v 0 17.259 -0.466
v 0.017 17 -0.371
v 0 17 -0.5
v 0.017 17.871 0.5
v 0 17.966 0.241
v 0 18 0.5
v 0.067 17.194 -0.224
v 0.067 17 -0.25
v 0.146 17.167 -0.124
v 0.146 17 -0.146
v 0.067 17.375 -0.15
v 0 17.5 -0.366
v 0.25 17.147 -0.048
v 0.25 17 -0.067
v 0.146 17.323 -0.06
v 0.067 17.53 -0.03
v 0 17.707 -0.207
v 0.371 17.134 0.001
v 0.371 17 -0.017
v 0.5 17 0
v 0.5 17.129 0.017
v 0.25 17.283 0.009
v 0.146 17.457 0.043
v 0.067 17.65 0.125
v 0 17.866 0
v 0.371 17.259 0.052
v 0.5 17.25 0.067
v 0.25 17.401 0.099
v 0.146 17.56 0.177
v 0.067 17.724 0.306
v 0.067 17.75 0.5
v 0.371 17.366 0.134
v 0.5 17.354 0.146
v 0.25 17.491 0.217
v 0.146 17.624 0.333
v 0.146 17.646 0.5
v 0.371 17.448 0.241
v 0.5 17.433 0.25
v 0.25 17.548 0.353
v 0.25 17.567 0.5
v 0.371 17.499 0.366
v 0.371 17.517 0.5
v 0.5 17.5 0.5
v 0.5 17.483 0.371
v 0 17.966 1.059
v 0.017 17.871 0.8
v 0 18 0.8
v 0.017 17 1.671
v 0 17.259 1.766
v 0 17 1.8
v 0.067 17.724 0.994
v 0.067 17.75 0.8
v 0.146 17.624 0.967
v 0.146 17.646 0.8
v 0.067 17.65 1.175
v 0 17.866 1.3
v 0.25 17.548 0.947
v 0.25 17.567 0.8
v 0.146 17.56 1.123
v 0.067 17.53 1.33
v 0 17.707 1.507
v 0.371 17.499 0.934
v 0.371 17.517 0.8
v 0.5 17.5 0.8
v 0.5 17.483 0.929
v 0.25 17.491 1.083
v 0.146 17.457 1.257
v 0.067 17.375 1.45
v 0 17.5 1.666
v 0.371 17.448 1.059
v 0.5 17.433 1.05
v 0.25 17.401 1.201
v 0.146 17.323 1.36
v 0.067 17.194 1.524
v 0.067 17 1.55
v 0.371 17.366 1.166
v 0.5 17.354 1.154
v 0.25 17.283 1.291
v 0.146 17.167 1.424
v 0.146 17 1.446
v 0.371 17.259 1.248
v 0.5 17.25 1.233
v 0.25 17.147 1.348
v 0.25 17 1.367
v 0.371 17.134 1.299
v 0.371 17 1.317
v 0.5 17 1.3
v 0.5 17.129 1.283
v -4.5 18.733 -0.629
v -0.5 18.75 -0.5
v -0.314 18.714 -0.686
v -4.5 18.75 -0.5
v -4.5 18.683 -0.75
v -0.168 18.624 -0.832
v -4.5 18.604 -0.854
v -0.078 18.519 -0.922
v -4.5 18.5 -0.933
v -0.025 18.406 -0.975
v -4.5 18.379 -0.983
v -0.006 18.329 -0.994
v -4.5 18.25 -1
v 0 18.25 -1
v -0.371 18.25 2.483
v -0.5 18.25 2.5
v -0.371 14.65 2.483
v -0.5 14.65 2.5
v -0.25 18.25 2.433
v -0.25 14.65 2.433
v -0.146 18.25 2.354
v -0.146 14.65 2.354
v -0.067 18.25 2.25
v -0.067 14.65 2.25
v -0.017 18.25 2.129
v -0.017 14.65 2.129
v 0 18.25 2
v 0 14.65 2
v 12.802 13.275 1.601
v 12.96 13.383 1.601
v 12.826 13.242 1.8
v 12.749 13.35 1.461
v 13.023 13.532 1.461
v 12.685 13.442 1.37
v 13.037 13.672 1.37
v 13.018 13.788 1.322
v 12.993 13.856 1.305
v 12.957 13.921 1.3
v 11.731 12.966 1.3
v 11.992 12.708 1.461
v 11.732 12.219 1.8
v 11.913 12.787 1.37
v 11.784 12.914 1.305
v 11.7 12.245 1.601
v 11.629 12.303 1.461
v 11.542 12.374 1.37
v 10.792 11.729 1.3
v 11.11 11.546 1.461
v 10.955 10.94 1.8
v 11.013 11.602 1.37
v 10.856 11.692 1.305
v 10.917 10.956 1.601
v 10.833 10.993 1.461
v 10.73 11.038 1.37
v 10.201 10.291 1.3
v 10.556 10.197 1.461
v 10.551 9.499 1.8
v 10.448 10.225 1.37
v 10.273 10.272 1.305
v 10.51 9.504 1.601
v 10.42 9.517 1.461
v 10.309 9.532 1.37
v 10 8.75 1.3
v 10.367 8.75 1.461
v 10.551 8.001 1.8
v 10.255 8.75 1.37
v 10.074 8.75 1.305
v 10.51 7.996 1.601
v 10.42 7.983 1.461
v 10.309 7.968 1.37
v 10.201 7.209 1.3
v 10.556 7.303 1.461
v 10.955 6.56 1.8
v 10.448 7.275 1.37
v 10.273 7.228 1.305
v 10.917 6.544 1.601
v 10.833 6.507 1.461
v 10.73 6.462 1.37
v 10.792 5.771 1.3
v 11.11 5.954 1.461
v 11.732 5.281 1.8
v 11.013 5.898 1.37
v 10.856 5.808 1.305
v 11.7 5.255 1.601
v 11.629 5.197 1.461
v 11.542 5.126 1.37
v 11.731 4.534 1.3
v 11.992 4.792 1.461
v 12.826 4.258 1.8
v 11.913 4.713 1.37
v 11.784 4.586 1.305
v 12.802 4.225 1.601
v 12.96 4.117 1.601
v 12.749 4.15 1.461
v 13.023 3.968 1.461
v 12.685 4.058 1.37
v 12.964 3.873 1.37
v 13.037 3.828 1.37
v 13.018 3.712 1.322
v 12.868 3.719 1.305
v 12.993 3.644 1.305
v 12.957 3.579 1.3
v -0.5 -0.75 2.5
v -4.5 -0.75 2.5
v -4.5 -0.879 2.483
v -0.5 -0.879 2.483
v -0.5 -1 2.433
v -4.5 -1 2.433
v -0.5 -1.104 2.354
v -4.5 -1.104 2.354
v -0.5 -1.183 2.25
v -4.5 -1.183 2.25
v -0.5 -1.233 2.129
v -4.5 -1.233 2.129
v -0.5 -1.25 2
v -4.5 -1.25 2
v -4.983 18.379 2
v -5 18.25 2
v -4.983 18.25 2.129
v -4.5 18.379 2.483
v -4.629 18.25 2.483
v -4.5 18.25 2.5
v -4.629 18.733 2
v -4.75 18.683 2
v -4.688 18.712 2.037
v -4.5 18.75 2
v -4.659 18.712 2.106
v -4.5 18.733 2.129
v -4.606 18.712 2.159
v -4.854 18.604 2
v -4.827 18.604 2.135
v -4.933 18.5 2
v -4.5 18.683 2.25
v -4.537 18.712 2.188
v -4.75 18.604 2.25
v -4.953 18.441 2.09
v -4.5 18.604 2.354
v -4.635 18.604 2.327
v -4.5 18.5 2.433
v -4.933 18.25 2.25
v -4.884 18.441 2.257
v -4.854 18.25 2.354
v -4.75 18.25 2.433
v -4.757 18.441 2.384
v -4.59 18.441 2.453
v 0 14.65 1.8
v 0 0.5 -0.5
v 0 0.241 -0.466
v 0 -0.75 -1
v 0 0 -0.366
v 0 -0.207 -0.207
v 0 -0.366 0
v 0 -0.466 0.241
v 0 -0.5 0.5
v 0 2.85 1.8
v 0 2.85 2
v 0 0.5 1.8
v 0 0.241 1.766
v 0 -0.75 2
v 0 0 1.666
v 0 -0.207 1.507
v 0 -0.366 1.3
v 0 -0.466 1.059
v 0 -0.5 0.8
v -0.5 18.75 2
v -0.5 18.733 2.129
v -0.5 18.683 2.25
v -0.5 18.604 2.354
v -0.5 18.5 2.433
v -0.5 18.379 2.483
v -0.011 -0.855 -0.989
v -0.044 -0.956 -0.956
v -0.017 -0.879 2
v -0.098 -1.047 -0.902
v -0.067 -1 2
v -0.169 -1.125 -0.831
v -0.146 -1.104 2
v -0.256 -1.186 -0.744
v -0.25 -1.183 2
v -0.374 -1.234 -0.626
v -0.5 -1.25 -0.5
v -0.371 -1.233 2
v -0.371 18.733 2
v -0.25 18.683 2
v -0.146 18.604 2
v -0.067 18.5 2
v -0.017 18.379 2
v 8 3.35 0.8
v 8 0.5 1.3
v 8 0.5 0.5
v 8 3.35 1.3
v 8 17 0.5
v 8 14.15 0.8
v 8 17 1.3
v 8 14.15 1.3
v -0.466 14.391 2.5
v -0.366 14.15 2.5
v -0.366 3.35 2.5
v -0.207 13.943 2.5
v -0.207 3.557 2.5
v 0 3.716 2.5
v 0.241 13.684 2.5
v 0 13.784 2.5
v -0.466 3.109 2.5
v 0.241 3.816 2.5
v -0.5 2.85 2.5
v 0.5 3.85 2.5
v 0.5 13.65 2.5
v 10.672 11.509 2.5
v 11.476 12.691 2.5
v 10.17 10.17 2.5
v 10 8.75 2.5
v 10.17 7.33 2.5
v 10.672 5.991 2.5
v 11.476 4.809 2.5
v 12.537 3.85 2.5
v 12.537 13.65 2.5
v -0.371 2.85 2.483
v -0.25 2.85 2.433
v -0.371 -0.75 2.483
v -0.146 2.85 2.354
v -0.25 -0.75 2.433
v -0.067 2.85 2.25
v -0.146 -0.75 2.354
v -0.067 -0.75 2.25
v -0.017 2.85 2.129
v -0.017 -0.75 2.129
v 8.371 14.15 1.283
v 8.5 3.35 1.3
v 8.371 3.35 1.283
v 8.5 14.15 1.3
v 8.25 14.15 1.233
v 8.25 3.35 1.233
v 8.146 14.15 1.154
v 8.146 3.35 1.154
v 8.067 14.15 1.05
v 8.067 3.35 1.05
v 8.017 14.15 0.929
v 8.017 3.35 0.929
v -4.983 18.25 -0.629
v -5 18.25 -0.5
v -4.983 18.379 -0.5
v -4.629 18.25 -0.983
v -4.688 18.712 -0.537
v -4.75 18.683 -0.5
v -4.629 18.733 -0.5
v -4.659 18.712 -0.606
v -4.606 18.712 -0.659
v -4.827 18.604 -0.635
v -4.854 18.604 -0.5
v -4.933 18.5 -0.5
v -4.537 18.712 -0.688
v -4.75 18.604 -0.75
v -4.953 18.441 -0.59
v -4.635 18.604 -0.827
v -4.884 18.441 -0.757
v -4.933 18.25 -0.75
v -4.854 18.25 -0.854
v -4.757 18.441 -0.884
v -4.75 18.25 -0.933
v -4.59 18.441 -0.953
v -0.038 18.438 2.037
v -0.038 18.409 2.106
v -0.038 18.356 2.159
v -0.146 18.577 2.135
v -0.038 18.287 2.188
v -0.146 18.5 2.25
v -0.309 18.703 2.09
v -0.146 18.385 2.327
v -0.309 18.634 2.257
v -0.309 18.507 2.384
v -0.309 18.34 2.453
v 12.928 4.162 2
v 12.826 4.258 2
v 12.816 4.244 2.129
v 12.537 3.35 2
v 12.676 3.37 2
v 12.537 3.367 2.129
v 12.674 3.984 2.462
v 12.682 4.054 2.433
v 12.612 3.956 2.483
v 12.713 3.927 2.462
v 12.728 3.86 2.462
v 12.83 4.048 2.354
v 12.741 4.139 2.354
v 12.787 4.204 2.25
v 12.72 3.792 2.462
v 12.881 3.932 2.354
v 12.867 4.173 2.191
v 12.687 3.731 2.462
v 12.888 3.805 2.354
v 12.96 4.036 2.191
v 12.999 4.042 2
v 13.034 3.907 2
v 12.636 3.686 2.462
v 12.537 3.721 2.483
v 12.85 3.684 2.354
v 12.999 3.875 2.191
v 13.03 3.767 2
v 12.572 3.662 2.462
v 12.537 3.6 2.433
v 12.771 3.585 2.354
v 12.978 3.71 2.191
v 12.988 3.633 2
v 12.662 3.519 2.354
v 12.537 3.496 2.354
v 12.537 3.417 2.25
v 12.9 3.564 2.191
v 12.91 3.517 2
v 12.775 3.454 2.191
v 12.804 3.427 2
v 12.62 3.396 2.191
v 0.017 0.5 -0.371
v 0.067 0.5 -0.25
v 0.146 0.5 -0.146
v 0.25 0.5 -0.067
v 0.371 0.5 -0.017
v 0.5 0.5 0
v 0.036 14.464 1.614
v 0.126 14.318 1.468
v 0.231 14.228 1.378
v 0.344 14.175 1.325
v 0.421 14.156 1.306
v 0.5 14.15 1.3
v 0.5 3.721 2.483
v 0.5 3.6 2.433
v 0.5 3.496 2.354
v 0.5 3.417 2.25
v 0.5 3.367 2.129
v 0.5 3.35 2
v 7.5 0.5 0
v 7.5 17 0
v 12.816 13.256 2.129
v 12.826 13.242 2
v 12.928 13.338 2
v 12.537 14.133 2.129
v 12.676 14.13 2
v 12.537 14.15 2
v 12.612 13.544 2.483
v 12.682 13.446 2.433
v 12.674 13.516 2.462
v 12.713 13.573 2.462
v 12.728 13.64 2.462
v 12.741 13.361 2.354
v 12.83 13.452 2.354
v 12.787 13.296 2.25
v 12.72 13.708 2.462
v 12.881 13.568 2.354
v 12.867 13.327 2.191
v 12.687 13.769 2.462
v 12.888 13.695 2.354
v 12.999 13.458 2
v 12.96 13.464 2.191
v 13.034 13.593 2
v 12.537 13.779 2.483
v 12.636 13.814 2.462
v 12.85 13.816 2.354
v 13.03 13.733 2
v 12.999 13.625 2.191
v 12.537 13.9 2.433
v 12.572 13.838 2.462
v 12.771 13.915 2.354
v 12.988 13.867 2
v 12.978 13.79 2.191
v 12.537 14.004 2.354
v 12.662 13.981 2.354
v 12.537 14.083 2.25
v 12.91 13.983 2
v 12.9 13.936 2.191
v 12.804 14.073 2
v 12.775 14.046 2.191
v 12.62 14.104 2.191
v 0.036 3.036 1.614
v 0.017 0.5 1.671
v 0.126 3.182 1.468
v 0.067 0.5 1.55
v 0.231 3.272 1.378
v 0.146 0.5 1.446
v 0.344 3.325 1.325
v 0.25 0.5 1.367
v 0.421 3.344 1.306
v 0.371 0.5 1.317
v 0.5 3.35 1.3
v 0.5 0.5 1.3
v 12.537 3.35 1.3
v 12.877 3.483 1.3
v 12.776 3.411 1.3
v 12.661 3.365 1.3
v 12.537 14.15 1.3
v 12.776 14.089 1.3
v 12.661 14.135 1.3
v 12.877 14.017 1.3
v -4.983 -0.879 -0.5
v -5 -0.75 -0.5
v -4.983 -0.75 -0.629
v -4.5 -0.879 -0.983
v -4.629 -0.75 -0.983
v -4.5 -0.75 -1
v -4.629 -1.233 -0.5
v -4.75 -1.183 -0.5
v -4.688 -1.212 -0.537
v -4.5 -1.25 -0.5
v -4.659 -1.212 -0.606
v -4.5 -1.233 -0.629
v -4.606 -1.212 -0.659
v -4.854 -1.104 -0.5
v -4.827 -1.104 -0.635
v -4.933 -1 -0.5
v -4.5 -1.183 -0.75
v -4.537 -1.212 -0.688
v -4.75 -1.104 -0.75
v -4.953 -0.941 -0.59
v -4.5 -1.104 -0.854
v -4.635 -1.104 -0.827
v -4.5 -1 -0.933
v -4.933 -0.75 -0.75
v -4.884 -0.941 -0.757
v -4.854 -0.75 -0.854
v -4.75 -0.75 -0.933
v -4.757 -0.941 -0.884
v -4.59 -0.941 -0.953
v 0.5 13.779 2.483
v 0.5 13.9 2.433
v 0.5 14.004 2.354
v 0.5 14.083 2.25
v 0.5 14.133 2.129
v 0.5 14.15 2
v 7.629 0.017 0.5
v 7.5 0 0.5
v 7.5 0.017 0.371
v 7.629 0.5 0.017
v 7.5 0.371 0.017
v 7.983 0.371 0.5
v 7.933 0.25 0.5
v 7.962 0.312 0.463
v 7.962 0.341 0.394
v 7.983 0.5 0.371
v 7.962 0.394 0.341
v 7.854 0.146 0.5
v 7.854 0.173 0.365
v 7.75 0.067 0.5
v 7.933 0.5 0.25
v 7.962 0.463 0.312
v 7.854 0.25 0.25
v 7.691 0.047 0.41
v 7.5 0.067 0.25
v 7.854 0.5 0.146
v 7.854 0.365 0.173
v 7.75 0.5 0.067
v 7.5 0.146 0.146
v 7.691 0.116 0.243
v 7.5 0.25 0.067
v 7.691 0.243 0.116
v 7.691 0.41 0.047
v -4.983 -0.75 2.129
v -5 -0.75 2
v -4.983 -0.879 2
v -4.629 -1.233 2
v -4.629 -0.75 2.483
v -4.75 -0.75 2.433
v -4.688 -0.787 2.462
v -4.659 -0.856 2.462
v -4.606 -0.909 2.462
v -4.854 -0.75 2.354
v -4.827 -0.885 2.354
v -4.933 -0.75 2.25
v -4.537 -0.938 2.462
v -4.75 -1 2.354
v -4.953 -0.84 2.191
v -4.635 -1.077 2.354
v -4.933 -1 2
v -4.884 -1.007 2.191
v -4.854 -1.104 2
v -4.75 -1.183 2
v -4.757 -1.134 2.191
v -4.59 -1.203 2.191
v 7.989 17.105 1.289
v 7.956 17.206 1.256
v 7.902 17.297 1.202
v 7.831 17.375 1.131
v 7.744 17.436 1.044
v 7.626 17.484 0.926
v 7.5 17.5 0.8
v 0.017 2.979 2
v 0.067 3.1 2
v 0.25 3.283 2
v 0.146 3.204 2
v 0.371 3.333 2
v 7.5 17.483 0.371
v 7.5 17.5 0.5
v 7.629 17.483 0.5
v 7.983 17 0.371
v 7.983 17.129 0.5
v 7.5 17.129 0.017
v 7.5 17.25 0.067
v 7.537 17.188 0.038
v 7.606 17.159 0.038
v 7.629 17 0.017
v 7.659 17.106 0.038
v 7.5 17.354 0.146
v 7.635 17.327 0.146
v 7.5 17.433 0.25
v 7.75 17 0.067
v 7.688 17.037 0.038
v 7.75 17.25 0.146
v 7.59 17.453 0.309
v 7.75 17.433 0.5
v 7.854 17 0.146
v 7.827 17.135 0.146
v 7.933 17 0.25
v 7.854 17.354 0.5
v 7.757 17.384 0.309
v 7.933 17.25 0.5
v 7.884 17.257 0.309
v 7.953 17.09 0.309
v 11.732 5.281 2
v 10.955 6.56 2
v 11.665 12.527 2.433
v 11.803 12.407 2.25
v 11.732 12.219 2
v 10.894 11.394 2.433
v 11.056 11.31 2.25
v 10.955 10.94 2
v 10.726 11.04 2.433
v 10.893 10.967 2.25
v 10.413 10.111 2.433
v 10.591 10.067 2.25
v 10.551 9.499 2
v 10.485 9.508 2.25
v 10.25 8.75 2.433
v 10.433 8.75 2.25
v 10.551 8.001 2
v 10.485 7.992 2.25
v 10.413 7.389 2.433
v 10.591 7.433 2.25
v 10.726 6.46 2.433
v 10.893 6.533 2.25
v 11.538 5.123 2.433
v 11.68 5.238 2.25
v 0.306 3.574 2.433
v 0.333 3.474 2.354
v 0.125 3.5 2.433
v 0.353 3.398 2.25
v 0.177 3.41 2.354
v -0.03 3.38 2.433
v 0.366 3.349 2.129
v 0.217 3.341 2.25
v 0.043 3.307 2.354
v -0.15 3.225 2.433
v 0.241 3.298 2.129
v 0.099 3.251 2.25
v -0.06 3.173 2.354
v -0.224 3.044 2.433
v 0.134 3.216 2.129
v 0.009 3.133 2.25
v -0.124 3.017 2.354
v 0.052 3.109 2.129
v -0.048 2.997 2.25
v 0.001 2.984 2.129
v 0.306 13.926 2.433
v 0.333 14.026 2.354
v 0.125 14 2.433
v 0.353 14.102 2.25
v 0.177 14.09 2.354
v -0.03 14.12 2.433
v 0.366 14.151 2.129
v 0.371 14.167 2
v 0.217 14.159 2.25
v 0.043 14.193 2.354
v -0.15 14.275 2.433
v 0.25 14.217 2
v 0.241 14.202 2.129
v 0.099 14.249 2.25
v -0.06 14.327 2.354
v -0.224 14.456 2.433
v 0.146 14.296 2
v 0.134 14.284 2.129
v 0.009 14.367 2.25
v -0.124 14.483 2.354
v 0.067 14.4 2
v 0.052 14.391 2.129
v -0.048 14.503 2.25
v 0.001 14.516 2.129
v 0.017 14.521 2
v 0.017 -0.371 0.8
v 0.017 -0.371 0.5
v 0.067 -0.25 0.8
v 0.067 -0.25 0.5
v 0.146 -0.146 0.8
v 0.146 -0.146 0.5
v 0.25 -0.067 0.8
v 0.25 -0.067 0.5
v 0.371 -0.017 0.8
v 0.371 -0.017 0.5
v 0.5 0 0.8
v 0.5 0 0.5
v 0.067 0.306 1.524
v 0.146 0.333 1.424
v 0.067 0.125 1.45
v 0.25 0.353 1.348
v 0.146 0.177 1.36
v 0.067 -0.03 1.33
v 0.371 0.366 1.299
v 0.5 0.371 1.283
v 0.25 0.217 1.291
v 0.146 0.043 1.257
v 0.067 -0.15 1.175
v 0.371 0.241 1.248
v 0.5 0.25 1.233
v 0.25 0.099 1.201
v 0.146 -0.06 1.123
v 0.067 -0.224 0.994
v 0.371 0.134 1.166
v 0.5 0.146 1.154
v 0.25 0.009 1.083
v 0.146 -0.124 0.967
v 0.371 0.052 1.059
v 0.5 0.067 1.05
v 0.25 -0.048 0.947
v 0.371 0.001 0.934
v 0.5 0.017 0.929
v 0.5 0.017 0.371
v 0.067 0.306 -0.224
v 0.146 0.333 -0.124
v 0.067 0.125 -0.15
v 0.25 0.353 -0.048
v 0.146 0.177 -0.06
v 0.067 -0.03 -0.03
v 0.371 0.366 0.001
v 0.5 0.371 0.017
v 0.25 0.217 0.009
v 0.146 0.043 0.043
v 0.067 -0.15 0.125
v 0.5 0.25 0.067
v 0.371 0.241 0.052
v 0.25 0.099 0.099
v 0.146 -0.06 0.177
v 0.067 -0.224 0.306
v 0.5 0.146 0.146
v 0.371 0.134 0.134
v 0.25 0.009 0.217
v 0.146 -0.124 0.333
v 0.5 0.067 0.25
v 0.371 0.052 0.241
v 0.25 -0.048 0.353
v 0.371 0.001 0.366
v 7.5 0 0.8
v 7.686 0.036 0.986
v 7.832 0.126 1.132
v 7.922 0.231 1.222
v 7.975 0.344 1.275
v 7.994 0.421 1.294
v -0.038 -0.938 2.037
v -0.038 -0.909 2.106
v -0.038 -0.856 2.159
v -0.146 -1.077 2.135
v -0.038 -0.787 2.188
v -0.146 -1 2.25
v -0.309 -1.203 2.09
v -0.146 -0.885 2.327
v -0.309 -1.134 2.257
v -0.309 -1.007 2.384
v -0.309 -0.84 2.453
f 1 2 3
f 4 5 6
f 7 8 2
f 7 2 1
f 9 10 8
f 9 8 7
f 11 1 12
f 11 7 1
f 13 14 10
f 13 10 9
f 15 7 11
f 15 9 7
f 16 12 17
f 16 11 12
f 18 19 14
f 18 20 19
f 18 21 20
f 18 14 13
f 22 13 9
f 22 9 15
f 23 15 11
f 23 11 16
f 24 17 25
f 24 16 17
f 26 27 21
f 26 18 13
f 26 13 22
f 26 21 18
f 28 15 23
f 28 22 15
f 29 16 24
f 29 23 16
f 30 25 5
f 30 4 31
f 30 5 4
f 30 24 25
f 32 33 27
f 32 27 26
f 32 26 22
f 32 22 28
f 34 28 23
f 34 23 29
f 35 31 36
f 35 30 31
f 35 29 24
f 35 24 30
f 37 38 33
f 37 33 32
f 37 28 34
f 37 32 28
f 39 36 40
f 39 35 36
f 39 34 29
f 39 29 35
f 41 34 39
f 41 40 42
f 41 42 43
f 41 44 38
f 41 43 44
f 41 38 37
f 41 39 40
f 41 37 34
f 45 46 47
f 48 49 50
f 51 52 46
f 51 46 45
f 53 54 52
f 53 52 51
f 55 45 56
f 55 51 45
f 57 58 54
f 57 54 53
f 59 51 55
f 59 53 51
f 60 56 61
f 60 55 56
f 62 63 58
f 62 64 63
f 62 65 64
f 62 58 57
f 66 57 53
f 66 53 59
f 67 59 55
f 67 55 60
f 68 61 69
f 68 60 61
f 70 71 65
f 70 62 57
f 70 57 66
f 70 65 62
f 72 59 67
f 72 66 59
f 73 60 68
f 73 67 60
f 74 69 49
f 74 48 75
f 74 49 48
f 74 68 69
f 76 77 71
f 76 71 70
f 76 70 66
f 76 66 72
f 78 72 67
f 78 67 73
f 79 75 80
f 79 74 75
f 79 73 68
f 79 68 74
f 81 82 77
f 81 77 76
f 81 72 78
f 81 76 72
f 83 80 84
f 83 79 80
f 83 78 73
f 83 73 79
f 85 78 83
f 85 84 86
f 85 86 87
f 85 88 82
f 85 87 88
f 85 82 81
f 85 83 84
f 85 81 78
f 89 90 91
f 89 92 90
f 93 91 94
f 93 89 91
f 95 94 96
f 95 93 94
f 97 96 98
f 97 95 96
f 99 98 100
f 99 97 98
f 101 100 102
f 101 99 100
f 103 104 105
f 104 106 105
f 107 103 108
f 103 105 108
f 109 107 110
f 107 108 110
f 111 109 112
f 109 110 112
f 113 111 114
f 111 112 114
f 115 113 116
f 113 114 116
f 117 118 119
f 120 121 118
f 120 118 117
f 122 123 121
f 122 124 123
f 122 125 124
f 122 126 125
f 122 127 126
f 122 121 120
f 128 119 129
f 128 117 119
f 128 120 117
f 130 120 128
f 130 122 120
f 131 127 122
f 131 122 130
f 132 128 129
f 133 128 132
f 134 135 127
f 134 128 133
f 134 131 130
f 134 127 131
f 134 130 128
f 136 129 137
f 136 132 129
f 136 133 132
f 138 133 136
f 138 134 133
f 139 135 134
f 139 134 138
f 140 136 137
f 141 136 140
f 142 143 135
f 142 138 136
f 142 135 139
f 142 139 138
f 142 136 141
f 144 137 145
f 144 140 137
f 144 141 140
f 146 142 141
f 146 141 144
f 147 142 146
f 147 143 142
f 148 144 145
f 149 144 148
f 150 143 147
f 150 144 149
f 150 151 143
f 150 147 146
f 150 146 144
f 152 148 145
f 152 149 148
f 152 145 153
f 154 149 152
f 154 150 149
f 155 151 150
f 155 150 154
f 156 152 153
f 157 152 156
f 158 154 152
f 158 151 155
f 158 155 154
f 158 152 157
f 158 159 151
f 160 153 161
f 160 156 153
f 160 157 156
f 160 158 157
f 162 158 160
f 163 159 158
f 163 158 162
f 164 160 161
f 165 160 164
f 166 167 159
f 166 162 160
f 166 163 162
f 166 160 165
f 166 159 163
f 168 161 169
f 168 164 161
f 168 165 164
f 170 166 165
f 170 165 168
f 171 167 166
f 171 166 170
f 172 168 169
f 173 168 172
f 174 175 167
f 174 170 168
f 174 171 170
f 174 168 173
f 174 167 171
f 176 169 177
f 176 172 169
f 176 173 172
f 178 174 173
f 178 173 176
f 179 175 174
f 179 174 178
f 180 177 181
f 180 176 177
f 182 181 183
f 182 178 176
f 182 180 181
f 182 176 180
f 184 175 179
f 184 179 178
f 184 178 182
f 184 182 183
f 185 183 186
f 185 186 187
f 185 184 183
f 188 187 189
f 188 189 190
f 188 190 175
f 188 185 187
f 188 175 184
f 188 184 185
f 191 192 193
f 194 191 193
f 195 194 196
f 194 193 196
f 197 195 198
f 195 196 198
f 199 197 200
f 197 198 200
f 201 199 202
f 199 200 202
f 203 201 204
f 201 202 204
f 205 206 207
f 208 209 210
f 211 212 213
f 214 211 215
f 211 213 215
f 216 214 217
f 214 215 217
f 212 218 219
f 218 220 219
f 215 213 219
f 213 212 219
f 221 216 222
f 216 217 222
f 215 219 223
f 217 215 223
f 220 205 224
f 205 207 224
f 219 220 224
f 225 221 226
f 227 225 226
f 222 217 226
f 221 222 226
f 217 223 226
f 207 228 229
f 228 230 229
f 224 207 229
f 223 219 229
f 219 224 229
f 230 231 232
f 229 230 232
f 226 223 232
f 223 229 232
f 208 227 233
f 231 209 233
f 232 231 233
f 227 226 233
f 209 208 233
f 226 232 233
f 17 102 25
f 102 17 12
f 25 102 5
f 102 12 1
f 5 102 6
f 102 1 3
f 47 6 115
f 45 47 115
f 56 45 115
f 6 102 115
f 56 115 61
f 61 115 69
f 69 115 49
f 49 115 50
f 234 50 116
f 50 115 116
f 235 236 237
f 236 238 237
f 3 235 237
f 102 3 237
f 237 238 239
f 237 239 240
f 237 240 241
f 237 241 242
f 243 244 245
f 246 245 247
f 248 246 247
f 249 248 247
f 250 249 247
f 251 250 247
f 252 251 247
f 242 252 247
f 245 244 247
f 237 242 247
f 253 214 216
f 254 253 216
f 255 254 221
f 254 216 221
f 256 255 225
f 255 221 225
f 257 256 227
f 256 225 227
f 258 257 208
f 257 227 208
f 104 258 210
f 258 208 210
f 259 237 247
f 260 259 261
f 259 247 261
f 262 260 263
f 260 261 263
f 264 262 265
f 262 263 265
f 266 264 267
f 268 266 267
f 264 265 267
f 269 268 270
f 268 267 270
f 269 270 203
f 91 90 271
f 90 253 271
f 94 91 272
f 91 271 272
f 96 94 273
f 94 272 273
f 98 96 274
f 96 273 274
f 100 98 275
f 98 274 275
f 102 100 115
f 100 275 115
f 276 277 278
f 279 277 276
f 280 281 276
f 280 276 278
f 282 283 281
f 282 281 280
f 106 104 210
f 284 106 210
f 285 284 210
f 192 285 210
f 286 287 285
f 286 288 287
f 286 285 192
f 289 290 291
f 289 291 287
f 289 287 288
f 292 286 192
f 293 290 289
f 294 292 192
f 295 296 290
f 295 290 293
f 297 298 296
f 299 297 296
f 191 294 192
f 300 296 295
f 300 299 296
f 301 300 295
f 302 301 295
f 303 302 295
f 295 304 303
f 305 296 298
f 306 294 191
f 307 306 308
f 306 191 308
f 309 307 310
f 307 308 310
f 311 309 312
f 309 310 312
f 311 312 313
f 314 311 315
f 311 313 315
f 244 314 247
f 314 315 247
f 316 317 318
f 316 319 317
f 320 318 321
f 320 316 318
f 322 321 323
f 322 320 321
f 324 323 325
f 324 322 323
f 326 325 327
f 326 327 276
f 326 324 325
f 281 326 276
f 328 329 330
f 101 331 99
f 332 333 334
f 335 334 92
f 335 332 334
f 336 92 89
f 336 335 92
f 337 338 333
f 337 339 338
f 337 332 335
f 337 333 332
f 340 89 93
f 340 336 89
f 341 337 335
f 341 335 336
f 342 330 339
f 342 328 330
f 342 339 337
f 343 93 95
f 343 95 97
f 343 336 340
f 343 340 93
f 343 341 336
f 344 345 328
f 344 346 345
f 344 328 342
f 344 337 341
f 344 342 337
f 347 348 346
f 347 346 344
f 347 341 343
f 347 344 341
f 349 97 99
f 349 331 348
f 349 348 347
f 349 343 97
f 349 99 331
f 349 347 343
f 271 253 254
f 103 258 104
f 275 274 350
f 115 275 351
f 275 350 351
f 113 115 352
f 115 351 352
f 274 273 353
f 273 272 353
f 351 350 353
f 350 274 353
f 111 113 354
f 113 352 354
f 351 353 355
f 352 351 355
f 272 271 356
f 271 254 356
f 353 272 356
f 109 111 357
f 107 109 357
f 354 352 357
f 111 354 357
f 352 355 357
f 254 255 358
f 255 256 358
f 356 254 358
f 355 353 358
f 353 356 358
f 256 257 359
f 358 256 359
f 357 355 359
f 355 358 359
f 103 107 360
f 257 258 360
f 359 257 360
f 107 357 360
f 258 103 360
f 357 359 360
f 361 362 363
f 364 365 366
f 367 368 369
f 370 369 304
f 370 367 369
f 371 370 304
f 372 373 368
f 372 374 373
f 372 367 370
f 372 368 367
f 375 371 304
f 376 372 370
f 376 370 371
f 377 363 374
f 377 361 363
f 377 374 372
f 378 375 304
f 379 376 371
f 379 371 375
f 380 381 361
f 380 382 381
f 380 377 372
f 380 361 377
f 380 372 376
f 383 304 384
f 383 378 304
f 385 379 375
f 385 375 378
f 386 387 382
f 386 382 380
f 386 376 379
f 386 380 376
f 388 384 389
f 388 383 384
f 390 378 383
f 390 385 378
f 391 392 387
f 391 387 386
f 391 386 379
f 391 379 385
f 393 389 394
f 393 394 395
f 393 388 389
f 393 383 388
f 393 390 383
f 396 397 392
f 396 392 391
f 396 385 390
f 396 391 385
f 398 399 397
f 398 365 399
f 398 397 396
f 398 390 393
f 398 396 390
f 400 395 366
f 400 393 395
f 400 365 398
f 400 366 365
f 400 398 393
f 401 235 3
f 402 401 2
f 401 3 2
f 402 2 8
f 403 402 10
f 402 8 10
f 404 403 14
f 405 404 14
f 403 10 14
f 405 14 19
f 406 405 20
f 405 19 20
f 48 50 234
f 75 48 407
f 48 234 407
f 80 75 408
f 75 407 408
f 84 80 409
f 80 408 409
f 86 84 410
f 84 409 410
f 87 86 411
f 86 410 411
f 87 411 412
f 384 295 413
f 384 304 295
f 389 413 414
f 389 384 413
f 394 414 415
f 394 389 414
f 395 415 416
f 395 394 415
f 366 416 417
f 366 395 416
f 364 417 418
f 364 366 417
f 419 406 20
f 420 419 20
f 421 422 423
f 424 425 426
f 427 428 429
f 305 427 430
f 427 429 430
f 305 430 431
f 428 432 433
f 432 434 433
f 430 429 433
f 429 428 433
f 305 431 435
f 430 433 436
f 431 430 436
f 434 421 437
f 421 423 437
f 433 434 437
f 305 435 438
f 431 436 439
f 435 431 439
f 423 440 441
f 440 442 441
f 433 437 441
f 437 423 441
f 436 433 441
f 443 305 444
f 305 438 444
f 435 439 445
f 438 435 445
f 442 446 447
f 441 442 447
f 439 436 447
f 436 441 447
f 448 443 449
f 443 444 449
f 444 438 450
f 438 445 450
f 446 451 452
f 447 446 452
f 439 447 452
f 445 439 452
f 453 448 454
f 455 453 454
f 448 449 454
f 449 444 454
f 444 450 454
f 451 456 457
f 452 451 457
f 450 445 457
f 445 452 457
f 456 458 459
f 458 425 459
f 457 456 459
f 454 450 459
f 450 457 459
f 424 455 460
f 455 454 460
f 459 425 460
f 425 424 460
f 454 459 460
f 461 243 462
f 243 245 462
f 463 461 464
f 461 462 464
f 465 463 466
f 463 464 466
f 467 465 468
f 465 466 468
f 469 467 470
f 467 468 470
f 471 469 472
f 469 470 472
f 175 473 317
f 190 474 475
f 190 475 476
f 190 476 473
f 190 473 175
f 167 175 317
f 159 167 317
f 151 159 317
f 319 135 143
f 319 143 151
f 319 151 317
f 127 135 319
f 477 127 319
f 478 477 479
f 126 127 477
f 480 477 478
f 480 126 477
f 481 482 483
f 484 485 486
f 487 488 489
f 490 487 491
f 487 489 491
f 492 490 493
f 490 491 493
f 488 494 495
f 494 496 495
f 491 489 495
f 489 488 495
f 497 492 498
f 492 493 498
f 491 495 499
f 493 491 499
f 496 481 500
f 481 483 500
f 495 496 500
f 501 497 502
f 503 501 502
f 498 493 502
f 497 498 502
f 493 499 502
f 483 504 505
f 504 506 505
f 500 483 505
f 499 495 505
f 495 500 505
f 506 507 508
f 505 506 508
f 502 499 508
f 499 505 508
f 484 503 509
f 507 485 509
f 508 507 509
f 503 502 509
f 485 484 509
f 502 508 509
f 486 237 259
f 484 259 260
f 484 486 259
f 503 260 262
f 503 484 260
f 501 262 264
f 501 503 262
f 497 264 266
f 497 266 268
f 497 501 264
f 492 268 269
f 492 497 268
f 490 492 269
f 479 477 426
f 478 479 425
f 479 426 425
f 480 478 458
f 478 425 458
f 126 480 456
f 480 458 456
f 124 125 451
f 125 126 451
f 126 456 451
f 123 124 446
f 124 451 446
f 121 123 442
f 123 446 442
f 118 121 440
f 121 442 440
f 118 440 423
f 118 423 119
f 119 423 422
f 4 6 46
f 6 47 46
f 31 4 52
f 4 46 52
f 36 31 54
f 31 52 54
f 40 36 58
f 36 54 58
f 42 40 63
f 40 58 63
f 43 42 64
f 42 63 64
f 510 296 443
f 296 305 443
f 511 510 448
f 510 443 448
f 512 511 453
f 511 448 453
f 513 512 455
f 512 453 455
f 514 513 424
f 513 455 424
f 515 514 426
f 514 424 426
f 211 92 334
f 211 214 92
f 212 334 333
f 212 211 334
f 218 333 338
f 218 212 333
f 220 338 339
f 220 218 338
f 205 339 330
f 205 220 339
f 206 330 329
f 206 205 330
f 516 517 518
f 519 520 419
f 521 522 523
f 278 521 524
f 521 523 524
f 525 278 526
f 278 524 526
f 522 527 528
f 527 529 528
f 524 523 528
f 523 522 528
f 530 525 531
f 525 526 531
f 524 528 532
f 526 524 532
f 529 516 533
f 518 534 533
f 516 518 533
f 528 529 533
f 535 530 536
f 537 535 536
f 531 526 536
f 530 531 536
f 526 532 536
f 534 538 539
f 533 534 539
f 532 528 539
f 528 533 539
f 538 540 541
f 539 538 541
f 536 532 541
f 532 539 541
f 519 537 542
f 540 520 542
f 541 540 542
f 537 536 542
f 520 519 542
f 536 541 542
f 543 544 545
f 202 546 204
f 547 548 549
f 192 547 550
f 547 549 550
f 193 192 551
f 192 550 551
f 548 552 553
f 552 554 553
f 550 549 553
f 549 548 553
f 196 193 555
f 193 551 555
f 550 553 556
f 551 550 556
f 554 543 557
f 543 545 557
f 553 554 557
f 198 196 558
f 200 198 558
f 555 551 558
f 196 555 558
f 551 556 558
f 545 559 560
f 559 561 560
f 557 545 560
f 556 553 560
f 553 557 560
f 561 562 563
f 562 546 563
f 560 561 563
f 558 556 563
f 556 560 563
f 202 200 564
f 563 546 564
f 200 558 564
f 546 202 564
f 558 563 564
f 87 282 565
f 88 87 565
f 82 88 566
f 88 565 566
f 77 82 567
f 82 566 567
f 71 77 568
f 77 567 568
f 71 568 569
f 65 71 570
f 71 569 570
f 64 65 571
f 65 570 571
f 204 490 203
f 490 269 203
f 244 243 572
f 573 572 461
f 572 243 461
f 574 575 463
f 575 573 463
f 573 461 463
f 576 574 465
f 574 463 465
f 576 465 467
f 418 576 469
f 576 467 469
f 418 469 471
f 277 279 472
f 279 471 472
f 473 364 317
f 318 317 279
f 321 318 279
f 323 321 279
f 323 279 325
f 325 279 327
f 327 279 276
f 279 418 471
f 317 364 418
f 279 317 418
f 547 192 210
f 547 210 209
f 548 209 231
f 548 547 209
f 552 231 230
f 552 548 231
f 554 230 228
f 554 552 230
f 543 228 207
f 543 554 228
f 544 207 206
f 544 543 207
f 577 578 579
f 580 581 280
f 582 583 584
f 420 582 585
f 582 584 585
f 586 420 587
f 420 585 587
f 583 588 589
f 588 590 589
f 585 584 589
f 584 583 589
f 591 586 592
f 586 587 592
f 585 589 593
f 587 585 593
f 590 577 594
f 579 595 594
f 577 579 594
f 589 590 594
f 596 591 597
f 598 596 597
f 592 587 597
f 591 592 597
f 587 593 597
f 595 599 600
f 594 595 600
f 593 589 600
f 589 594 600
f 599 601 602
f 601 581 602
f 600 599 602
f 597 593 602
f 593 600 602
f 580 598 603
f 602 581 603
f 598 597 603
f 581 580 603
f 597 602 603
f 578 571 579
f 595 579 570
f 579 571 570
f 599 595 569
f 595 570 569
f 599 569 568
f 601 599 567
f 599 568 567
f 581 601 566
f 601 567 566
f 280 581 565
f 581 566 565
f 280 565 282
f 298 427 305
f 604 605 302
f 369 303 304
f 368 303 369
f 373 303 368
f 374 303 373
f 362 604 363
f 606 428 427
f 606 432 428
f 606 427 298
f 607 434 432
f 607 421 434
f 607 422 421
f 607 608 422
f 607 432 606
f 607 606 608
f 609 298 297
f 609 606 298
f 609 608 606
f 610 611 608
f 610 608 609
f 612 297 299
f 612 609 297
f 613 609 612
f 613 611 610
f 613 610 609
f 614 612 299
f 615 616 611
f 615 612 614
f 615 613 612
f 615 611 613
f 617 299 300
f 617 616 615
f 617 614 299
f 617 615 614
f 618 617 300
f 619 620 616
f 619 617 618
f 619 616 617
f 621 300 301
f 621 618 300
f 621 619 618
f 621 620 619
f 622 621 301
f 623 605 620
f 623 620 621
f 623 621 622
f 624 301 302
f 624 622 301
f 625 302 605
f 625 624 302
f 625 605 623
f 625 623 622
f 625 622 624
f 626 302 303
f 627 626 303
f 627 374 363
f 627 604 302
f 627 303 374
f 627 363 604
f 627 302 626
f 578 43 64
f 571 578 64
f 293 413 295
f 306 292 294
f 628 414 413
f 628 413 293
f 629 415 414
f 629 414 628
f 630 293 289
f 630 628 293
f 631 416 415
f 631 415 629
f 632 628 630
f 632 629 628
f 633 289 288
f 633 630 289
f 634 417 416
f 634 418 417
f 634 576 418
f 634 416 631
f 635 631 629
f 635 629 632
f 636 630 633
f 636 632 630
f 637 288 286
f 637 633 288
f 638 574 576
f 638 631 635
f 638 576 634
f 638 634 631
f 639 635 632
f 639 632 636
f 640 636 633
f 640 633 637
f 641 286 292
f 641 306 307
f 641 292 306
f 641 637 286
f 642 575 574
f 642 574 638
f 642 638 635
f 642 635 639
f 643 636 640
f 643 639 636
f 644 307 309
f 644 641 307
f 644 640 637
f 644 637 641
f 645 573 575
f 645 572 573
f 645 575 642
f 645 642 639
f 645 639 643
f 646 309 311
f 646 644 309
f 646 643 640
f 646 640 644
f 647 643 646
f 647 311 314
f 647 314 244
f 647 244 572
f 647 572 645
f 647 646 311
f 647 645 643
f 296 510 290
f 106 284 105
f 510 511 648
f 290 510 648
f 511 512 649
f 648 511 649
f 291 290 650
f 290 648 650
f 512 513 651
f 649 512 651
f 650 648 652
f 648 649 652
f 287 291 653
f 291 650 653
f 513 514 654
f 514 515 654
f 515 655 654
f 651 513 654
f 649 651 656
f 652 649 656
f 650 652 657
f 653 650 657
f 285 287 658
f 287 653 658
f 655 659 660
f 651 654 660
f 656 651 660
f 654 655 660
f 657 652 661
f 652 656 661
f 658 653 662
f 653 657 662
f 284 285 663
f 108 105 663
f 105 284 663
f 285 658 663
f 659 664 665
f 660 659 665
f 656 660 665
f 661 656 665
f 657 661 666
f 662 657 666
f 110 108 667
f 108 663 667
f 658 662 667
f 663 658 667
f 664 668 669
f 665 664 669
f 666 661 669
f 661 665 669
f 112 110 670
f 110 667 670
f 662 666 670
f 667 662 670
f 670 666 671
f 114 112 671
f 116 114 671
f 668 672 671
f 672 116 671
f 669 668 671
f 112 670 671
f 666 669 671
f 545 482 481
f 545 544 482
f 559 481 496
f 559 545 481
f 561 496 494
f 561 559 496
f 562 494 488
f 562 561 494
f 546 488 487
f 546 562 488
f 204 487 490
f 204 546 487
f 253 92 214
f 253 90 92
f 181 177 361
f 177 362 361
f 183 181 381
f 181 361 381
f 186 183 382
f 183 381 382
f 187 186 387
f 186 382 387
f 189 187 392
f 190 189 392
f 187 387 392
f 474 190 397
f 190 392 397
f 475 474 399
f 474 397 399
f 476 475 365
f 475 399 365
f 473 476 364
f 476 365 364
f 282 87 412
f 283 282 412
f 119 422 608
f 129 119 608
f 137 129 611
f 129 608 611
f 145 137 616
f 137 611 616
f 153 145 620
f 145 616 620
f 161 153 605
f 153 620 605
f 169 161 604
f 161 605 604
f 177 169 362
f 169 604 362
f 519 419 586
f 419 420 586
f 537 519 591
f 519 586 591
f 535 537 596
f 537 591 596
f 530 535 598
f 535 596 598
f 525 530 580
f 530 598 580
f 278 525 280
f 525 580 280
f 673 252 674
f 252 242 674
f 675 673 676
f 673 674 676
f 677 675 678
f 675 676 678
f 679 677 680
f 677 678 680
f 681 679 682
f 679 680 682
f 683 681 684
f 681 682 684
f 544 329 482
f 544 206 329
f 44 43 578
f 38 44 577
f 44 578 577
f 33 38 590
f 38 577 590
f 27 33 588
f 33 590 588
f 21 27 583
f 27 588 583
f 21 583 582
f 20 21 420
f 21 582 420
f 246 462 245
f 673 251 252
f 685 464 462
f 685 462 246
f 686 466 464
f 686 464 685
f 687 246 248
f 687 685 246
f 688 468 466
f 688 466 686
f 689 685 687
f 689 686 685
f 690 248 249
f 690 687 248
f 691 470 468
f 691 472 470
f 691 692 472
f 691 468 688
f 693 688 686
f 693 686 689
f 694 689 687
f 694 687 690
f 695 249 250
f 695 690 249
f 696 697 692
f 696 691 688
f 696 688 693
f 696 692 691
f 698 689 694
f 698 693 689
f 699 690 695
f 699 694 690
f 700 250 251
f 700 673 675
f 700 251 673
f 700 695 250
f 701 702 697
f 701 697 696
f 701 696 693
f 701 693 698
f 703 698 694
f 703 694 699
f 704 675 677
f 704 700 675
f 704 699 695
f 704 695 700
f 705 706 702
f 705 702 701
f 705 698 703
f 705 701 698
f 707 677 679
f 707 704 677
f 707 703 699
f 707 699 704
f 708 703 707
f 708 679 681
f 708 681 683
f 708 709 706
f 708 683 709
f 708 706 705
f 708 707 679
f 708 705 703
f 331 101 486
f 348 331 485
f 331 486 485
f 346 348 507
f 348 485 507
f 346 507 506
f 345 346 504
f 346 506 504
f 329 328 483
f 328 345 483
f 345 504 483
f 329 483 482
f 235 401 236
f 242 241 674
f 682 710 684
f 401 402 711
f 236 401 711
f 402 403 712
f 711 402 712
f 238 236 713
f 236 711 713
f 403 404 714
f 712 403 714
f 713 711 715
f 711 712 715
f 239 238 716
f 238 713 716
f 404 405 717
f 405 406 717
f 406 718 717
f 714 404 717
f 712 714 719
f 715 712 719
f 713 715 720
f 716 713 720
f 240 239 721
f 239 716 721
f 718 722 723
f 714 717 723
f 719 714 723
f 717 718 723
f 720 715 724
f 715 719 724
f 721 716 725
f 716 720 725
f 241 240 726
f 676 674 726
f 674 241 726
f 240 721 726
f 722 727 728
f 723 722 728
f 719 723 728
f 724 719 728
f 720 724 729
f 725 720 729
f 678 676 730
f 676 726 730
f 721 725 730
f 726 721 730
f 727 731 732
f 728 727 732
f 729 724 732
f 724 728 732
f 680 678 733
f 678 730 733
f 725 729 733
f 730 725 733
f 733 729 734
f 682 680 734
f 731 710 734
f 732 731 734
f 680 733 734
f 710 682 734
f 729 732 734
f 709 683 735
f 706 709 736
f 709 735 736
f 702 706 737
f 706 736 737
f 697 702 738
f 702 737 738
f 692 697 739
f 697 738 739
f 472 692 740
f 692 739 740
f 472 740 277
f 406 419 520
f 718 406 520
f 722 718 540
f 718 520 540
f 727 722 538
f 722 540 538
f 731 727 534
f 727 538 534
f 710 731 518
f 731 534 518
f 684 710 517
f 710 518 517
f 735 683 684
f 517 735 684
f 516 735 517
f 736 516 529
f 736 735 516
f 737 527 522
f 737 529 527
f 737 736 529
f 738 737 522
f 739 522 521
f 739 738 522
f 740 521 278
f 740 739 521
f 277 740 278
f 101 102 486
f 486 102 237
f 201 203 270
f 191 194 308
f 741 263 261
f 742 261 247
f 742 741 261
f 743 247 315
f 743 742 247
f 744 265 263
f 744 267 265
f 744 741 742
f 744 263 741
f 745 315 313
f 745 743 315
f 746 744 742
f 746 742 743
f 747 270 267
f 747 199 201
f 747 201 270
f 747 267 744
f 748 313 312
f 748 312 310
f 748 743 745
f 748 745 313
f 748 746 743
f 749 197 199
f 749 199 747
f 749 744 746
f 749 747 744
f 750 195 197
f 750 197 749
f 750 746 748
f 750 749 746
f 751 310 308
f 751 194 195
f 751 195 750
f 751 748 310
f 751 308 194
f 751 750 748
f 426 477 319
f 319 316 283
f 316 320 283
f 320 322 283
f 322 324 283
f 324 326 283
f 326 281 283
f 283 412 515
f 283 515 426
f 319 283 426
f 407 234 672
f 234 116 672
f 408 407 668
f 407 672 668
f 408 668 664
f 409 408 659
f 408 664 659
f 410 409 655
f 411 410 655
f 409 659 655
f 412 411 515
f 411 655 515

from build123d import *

# Parameters (mm, degrees)
F1_DEPTH = 16
F2_W     = 20
F2_H     = 3.5
F3_DEPTH = 5
F5_DEPTH = 5
F6_W     = 17.5
F6_H     = 1.3
F7_DEPTH = 8
F8_R     = 0.5


# Not quite as in the source:
# - ends of sketch curves that miss each other by under 0.0002 mm in the source are joined


with BuildPart() as f1:
    # F0 (on Right) → F1 (new body)
    with BuildSketch(Plane.YZ):
        Polygon((14.15, 1.3), (14.15, 2.5), (3.35, 2.5), (3.35, 1.3), (0, 1.3), (0, 0), (17.5, 0), (17.5, 1.3), align=None)
    extrude(amount=F1_DEPTH)

    # F2 (on face) → F3 (join)
    with BuildSketch(Plane(origin=(0, 0, 0), x_dir=(0, -1, 0), z_dir=(-1, 0, 0))):
        with Locations((-8.75, 0.75)):
            Rectangle(F2_W, F2_H)
    extrude(amount=F3_DEPTH)

    # F4 (on face) → F5 (cut)
    with BuildSketch(Plane.XY.offset(2.5)):
        with BuildLine():
            ThreePointArc((16.0075383861, 14.2499948339), (10.5000136527, 8.7377452223), (16.0320477827, 3.2500933699))
            Line((16.0320477827, 3.2500933699), (16.0075383861, 14.2499948339))
        make_face()
    extrude(amount=-F5_DEPTH, mode=Mode.SUBTRACT)

    # F6 (on face) → F7 (cut)
    with BuildSketch(Plane.YZ.offset(16)):
        with Locations((8.75, 0.65)):
            Rectangle(F6_W, F6_H)
    extrude(amount=-F7_DEPTH, mode=Mode.SUBTRACT)

    # F8
    f8_edges = [f1.edges().sort_by_distance(p)[0] for p in [
        (7.477985, 3.35, 2.5),
        (14.955969, 3.35, 1.9),
        (14.955969, 14.15, 1.9),
        (10.5, 8.75, 2.5),
        (10.5, 8.75, 1.3),
        (7.477985, 14.15, 2.5),
        (8, 8.75, 1.3),
        (0, 8.75, 0),
        (0, 1.675, 1.3),
        (0, 0, 0.65),
        (0, 17.5, 0.65),
        (0, 15.825, 1.3),
        (-5, 8.75, -1),
        (-5, -1.25, 0.75),
        (-5, 8.75, 2.5),
        (-5, 18.75, 0.75),
        (-2.5, -1.25, -1),
        (-2.5, -1.25, 2.5),
        (0, -1.25, 0.75),
        (-2.5, 18.75, 2.5),
        (-2.5, 18.75, -1),
        (0, 18.75, 0.75),
        (4, 17.5, 1.3),
        (8, 17.5, 0.65),
        (4, 17.5, 0),
        (4, 0, 0),
        (8, 0, 0.65),
        (4, 0, 1.3),
        (8, 8.75, 0),
        (0, 1.05, 2.5),
        (0, 16.45, 2.5),
        (0, 3.35, 1.9),
        (0, 14.15, 1.9),
    ]]
    fillet(f8_edges, radius=F8_R)


solid = f1.part
